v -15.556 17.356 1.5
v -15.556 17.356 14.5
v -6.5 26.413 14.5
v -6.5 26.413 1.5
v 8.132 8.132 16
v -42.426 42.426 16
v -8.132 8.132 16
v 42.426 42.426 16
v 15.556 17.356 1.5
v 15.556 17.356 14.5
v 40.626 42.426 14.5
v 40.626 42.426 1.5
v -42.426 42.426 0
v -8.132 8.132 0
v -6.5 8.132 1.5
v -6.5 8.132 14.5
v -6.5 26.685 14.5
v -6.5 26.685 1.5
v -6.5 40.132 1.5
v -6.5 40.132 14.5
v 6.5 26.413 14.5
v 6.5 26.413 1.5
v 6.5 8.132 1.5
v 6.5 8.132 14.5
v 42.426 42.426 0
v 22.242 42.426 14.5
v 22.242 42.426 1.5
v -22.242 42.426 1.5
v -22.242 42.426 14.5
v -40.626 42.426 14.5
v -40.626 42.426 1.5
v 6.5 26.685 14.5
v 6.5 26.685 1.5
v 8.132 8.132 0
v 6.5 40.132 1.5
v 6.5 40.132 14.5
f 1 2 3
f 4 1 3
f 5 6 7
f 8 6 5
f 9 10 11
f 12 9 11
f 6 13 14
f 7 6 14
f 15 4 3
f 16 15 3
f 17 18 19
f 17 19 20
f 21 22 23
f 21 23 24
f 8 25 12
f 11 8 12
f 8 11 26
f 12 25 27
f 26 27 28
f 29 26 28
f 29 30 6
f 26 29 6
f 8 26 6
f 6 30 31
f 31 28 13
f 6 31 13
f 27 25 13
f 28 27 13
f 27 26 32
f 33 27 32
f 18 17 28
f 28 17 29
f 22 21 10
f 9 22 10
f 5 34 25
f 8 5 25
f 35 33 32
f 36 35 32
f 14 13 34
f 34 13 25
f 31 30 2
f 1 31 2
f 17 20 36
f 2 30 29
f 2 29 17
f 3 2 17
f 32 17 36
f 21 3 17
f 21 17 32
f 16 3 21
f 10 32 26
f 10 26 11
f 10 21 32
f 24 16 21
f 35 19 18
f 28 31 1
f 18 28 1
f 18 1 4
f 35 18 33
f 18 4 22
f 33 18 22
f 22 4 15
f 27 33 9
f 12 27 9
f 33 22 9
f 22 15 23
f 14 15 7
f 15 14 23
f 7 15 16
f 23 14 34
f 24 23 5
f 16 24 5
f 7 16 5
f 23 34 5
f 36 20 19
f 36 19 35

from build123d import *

# Parameters (mm, degrees)
F1_DEPTH = 16
F3_START = -1.5
F3_DEPTH = 13
F4_SIZE  = 11.5
F5_W     = 13
F5_H     = 13
F6_DEPTH = 32


with BuildPart() as f1:
    # F0 (on Top) → F1 (new body)
    with BuildSketch(Plane.XY):
        Polygon((-42.4264068712, 42.4264068712), (0, 0), (42.4264068712, 42.4264068712), align=None)
    extrude(amount=F1_DEPTH)

    # F2 (on face) → F3 (cut)
    with BuildSketch(Plane.XY.offset(16).offset(F3_START)):
        Polygon((-51.2700945749, 53.0700945749), (-15.5563491861, 17.3563491861), (-6.3639610307, 26.5487373415), (-42.0777064195, 62.2624827303), align=None)
        Polygon((6.3639610307, 26.5487373415), (15.5563491861, 17.3563491861), (49.0367116487, 50.8367116487), (39.8443234933, 60.0290998041), align=None)
    extrude(amount=-F3_DEPTH, mode=Mode.SUBTRACT)

    # F4
    f4_edges = [f1.edges().sort_by_distance(p)[0] for p in [
        (0, 0, 8),
    ]]
    chamfer(f4_edges, length=F4_SIZE)

    # F5 (on face) → F6 (cut)
    with BuildSketch(Plane.XZ.offset(-8.1317279836)):
        with Locations((0, 8)):
            Rectangle(F5_W, F5_H)
    extrude(amount=-F6_DEPTH, mode=Mode.SUBTRACT)


solid = f1.part
